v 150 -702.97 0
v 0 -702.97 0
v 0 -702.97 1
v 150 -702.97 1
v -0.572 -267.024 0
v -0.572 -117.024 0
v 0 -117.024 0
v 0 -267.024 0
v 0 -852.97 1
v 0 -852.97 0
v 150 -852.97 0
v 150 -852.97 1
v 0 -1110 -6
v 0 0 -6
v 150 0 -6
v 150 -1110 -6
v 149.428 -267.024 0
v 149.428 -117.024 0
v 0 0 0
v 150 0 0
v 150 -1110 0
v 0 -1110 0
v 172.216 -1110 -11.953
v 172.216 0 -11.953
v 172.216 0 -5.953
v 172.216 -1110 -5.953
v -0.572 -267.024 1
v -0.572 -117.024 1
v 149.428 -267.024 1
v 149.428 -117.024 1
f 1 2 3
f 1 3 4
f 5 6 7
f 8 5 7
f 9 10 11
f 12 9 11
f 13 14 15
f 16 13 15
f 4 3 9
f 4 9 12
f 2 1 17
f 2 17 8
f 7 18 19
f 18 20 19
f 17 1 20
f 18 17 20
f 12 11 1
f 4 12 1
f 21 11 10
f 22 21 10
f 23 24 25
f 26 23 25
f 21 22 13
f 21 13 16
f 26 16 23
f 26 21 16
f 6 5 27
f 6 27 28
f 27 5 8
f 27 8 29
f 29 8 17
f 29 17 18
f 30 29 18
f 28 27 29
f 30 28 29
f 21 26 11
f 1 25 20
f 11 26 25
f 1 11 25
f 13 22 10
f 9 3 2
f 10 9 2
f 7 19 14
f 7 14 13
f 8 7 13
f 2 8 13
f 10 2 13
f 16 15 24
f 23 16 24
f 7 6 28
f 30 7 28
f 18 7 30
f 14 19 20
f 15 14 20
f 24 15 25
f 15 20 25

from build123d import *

# Parameters (mm, degrees)
F1_DEPTH = 1110
F2_W     = 150
F2_H     = 150
F3_DEPTH = 1


with BuildPart() as f1:
    # F0 (on Front) → F1 (new body)
    with BuildSketch(Plane.XZ):
        Polygon((150, 0), (0, 0), (0, -6), (150, -6), (172.216294, -11.952838), (172.216294, -5.952838), align=None)
    extrude(amount=F1_DEPTH)

    # F2 (on face) → F3 (join)
    with BuildSketch(Plane.XY):
        with Locations((74.428144, -192.023769)):
            Rectangle(F2_W, F2_H)
        with Locations((75, -777.969706)):
            Rectangle(F2_W, F2_H)
    extrude(amount=F3_DEPTH)


solid = f1.part
